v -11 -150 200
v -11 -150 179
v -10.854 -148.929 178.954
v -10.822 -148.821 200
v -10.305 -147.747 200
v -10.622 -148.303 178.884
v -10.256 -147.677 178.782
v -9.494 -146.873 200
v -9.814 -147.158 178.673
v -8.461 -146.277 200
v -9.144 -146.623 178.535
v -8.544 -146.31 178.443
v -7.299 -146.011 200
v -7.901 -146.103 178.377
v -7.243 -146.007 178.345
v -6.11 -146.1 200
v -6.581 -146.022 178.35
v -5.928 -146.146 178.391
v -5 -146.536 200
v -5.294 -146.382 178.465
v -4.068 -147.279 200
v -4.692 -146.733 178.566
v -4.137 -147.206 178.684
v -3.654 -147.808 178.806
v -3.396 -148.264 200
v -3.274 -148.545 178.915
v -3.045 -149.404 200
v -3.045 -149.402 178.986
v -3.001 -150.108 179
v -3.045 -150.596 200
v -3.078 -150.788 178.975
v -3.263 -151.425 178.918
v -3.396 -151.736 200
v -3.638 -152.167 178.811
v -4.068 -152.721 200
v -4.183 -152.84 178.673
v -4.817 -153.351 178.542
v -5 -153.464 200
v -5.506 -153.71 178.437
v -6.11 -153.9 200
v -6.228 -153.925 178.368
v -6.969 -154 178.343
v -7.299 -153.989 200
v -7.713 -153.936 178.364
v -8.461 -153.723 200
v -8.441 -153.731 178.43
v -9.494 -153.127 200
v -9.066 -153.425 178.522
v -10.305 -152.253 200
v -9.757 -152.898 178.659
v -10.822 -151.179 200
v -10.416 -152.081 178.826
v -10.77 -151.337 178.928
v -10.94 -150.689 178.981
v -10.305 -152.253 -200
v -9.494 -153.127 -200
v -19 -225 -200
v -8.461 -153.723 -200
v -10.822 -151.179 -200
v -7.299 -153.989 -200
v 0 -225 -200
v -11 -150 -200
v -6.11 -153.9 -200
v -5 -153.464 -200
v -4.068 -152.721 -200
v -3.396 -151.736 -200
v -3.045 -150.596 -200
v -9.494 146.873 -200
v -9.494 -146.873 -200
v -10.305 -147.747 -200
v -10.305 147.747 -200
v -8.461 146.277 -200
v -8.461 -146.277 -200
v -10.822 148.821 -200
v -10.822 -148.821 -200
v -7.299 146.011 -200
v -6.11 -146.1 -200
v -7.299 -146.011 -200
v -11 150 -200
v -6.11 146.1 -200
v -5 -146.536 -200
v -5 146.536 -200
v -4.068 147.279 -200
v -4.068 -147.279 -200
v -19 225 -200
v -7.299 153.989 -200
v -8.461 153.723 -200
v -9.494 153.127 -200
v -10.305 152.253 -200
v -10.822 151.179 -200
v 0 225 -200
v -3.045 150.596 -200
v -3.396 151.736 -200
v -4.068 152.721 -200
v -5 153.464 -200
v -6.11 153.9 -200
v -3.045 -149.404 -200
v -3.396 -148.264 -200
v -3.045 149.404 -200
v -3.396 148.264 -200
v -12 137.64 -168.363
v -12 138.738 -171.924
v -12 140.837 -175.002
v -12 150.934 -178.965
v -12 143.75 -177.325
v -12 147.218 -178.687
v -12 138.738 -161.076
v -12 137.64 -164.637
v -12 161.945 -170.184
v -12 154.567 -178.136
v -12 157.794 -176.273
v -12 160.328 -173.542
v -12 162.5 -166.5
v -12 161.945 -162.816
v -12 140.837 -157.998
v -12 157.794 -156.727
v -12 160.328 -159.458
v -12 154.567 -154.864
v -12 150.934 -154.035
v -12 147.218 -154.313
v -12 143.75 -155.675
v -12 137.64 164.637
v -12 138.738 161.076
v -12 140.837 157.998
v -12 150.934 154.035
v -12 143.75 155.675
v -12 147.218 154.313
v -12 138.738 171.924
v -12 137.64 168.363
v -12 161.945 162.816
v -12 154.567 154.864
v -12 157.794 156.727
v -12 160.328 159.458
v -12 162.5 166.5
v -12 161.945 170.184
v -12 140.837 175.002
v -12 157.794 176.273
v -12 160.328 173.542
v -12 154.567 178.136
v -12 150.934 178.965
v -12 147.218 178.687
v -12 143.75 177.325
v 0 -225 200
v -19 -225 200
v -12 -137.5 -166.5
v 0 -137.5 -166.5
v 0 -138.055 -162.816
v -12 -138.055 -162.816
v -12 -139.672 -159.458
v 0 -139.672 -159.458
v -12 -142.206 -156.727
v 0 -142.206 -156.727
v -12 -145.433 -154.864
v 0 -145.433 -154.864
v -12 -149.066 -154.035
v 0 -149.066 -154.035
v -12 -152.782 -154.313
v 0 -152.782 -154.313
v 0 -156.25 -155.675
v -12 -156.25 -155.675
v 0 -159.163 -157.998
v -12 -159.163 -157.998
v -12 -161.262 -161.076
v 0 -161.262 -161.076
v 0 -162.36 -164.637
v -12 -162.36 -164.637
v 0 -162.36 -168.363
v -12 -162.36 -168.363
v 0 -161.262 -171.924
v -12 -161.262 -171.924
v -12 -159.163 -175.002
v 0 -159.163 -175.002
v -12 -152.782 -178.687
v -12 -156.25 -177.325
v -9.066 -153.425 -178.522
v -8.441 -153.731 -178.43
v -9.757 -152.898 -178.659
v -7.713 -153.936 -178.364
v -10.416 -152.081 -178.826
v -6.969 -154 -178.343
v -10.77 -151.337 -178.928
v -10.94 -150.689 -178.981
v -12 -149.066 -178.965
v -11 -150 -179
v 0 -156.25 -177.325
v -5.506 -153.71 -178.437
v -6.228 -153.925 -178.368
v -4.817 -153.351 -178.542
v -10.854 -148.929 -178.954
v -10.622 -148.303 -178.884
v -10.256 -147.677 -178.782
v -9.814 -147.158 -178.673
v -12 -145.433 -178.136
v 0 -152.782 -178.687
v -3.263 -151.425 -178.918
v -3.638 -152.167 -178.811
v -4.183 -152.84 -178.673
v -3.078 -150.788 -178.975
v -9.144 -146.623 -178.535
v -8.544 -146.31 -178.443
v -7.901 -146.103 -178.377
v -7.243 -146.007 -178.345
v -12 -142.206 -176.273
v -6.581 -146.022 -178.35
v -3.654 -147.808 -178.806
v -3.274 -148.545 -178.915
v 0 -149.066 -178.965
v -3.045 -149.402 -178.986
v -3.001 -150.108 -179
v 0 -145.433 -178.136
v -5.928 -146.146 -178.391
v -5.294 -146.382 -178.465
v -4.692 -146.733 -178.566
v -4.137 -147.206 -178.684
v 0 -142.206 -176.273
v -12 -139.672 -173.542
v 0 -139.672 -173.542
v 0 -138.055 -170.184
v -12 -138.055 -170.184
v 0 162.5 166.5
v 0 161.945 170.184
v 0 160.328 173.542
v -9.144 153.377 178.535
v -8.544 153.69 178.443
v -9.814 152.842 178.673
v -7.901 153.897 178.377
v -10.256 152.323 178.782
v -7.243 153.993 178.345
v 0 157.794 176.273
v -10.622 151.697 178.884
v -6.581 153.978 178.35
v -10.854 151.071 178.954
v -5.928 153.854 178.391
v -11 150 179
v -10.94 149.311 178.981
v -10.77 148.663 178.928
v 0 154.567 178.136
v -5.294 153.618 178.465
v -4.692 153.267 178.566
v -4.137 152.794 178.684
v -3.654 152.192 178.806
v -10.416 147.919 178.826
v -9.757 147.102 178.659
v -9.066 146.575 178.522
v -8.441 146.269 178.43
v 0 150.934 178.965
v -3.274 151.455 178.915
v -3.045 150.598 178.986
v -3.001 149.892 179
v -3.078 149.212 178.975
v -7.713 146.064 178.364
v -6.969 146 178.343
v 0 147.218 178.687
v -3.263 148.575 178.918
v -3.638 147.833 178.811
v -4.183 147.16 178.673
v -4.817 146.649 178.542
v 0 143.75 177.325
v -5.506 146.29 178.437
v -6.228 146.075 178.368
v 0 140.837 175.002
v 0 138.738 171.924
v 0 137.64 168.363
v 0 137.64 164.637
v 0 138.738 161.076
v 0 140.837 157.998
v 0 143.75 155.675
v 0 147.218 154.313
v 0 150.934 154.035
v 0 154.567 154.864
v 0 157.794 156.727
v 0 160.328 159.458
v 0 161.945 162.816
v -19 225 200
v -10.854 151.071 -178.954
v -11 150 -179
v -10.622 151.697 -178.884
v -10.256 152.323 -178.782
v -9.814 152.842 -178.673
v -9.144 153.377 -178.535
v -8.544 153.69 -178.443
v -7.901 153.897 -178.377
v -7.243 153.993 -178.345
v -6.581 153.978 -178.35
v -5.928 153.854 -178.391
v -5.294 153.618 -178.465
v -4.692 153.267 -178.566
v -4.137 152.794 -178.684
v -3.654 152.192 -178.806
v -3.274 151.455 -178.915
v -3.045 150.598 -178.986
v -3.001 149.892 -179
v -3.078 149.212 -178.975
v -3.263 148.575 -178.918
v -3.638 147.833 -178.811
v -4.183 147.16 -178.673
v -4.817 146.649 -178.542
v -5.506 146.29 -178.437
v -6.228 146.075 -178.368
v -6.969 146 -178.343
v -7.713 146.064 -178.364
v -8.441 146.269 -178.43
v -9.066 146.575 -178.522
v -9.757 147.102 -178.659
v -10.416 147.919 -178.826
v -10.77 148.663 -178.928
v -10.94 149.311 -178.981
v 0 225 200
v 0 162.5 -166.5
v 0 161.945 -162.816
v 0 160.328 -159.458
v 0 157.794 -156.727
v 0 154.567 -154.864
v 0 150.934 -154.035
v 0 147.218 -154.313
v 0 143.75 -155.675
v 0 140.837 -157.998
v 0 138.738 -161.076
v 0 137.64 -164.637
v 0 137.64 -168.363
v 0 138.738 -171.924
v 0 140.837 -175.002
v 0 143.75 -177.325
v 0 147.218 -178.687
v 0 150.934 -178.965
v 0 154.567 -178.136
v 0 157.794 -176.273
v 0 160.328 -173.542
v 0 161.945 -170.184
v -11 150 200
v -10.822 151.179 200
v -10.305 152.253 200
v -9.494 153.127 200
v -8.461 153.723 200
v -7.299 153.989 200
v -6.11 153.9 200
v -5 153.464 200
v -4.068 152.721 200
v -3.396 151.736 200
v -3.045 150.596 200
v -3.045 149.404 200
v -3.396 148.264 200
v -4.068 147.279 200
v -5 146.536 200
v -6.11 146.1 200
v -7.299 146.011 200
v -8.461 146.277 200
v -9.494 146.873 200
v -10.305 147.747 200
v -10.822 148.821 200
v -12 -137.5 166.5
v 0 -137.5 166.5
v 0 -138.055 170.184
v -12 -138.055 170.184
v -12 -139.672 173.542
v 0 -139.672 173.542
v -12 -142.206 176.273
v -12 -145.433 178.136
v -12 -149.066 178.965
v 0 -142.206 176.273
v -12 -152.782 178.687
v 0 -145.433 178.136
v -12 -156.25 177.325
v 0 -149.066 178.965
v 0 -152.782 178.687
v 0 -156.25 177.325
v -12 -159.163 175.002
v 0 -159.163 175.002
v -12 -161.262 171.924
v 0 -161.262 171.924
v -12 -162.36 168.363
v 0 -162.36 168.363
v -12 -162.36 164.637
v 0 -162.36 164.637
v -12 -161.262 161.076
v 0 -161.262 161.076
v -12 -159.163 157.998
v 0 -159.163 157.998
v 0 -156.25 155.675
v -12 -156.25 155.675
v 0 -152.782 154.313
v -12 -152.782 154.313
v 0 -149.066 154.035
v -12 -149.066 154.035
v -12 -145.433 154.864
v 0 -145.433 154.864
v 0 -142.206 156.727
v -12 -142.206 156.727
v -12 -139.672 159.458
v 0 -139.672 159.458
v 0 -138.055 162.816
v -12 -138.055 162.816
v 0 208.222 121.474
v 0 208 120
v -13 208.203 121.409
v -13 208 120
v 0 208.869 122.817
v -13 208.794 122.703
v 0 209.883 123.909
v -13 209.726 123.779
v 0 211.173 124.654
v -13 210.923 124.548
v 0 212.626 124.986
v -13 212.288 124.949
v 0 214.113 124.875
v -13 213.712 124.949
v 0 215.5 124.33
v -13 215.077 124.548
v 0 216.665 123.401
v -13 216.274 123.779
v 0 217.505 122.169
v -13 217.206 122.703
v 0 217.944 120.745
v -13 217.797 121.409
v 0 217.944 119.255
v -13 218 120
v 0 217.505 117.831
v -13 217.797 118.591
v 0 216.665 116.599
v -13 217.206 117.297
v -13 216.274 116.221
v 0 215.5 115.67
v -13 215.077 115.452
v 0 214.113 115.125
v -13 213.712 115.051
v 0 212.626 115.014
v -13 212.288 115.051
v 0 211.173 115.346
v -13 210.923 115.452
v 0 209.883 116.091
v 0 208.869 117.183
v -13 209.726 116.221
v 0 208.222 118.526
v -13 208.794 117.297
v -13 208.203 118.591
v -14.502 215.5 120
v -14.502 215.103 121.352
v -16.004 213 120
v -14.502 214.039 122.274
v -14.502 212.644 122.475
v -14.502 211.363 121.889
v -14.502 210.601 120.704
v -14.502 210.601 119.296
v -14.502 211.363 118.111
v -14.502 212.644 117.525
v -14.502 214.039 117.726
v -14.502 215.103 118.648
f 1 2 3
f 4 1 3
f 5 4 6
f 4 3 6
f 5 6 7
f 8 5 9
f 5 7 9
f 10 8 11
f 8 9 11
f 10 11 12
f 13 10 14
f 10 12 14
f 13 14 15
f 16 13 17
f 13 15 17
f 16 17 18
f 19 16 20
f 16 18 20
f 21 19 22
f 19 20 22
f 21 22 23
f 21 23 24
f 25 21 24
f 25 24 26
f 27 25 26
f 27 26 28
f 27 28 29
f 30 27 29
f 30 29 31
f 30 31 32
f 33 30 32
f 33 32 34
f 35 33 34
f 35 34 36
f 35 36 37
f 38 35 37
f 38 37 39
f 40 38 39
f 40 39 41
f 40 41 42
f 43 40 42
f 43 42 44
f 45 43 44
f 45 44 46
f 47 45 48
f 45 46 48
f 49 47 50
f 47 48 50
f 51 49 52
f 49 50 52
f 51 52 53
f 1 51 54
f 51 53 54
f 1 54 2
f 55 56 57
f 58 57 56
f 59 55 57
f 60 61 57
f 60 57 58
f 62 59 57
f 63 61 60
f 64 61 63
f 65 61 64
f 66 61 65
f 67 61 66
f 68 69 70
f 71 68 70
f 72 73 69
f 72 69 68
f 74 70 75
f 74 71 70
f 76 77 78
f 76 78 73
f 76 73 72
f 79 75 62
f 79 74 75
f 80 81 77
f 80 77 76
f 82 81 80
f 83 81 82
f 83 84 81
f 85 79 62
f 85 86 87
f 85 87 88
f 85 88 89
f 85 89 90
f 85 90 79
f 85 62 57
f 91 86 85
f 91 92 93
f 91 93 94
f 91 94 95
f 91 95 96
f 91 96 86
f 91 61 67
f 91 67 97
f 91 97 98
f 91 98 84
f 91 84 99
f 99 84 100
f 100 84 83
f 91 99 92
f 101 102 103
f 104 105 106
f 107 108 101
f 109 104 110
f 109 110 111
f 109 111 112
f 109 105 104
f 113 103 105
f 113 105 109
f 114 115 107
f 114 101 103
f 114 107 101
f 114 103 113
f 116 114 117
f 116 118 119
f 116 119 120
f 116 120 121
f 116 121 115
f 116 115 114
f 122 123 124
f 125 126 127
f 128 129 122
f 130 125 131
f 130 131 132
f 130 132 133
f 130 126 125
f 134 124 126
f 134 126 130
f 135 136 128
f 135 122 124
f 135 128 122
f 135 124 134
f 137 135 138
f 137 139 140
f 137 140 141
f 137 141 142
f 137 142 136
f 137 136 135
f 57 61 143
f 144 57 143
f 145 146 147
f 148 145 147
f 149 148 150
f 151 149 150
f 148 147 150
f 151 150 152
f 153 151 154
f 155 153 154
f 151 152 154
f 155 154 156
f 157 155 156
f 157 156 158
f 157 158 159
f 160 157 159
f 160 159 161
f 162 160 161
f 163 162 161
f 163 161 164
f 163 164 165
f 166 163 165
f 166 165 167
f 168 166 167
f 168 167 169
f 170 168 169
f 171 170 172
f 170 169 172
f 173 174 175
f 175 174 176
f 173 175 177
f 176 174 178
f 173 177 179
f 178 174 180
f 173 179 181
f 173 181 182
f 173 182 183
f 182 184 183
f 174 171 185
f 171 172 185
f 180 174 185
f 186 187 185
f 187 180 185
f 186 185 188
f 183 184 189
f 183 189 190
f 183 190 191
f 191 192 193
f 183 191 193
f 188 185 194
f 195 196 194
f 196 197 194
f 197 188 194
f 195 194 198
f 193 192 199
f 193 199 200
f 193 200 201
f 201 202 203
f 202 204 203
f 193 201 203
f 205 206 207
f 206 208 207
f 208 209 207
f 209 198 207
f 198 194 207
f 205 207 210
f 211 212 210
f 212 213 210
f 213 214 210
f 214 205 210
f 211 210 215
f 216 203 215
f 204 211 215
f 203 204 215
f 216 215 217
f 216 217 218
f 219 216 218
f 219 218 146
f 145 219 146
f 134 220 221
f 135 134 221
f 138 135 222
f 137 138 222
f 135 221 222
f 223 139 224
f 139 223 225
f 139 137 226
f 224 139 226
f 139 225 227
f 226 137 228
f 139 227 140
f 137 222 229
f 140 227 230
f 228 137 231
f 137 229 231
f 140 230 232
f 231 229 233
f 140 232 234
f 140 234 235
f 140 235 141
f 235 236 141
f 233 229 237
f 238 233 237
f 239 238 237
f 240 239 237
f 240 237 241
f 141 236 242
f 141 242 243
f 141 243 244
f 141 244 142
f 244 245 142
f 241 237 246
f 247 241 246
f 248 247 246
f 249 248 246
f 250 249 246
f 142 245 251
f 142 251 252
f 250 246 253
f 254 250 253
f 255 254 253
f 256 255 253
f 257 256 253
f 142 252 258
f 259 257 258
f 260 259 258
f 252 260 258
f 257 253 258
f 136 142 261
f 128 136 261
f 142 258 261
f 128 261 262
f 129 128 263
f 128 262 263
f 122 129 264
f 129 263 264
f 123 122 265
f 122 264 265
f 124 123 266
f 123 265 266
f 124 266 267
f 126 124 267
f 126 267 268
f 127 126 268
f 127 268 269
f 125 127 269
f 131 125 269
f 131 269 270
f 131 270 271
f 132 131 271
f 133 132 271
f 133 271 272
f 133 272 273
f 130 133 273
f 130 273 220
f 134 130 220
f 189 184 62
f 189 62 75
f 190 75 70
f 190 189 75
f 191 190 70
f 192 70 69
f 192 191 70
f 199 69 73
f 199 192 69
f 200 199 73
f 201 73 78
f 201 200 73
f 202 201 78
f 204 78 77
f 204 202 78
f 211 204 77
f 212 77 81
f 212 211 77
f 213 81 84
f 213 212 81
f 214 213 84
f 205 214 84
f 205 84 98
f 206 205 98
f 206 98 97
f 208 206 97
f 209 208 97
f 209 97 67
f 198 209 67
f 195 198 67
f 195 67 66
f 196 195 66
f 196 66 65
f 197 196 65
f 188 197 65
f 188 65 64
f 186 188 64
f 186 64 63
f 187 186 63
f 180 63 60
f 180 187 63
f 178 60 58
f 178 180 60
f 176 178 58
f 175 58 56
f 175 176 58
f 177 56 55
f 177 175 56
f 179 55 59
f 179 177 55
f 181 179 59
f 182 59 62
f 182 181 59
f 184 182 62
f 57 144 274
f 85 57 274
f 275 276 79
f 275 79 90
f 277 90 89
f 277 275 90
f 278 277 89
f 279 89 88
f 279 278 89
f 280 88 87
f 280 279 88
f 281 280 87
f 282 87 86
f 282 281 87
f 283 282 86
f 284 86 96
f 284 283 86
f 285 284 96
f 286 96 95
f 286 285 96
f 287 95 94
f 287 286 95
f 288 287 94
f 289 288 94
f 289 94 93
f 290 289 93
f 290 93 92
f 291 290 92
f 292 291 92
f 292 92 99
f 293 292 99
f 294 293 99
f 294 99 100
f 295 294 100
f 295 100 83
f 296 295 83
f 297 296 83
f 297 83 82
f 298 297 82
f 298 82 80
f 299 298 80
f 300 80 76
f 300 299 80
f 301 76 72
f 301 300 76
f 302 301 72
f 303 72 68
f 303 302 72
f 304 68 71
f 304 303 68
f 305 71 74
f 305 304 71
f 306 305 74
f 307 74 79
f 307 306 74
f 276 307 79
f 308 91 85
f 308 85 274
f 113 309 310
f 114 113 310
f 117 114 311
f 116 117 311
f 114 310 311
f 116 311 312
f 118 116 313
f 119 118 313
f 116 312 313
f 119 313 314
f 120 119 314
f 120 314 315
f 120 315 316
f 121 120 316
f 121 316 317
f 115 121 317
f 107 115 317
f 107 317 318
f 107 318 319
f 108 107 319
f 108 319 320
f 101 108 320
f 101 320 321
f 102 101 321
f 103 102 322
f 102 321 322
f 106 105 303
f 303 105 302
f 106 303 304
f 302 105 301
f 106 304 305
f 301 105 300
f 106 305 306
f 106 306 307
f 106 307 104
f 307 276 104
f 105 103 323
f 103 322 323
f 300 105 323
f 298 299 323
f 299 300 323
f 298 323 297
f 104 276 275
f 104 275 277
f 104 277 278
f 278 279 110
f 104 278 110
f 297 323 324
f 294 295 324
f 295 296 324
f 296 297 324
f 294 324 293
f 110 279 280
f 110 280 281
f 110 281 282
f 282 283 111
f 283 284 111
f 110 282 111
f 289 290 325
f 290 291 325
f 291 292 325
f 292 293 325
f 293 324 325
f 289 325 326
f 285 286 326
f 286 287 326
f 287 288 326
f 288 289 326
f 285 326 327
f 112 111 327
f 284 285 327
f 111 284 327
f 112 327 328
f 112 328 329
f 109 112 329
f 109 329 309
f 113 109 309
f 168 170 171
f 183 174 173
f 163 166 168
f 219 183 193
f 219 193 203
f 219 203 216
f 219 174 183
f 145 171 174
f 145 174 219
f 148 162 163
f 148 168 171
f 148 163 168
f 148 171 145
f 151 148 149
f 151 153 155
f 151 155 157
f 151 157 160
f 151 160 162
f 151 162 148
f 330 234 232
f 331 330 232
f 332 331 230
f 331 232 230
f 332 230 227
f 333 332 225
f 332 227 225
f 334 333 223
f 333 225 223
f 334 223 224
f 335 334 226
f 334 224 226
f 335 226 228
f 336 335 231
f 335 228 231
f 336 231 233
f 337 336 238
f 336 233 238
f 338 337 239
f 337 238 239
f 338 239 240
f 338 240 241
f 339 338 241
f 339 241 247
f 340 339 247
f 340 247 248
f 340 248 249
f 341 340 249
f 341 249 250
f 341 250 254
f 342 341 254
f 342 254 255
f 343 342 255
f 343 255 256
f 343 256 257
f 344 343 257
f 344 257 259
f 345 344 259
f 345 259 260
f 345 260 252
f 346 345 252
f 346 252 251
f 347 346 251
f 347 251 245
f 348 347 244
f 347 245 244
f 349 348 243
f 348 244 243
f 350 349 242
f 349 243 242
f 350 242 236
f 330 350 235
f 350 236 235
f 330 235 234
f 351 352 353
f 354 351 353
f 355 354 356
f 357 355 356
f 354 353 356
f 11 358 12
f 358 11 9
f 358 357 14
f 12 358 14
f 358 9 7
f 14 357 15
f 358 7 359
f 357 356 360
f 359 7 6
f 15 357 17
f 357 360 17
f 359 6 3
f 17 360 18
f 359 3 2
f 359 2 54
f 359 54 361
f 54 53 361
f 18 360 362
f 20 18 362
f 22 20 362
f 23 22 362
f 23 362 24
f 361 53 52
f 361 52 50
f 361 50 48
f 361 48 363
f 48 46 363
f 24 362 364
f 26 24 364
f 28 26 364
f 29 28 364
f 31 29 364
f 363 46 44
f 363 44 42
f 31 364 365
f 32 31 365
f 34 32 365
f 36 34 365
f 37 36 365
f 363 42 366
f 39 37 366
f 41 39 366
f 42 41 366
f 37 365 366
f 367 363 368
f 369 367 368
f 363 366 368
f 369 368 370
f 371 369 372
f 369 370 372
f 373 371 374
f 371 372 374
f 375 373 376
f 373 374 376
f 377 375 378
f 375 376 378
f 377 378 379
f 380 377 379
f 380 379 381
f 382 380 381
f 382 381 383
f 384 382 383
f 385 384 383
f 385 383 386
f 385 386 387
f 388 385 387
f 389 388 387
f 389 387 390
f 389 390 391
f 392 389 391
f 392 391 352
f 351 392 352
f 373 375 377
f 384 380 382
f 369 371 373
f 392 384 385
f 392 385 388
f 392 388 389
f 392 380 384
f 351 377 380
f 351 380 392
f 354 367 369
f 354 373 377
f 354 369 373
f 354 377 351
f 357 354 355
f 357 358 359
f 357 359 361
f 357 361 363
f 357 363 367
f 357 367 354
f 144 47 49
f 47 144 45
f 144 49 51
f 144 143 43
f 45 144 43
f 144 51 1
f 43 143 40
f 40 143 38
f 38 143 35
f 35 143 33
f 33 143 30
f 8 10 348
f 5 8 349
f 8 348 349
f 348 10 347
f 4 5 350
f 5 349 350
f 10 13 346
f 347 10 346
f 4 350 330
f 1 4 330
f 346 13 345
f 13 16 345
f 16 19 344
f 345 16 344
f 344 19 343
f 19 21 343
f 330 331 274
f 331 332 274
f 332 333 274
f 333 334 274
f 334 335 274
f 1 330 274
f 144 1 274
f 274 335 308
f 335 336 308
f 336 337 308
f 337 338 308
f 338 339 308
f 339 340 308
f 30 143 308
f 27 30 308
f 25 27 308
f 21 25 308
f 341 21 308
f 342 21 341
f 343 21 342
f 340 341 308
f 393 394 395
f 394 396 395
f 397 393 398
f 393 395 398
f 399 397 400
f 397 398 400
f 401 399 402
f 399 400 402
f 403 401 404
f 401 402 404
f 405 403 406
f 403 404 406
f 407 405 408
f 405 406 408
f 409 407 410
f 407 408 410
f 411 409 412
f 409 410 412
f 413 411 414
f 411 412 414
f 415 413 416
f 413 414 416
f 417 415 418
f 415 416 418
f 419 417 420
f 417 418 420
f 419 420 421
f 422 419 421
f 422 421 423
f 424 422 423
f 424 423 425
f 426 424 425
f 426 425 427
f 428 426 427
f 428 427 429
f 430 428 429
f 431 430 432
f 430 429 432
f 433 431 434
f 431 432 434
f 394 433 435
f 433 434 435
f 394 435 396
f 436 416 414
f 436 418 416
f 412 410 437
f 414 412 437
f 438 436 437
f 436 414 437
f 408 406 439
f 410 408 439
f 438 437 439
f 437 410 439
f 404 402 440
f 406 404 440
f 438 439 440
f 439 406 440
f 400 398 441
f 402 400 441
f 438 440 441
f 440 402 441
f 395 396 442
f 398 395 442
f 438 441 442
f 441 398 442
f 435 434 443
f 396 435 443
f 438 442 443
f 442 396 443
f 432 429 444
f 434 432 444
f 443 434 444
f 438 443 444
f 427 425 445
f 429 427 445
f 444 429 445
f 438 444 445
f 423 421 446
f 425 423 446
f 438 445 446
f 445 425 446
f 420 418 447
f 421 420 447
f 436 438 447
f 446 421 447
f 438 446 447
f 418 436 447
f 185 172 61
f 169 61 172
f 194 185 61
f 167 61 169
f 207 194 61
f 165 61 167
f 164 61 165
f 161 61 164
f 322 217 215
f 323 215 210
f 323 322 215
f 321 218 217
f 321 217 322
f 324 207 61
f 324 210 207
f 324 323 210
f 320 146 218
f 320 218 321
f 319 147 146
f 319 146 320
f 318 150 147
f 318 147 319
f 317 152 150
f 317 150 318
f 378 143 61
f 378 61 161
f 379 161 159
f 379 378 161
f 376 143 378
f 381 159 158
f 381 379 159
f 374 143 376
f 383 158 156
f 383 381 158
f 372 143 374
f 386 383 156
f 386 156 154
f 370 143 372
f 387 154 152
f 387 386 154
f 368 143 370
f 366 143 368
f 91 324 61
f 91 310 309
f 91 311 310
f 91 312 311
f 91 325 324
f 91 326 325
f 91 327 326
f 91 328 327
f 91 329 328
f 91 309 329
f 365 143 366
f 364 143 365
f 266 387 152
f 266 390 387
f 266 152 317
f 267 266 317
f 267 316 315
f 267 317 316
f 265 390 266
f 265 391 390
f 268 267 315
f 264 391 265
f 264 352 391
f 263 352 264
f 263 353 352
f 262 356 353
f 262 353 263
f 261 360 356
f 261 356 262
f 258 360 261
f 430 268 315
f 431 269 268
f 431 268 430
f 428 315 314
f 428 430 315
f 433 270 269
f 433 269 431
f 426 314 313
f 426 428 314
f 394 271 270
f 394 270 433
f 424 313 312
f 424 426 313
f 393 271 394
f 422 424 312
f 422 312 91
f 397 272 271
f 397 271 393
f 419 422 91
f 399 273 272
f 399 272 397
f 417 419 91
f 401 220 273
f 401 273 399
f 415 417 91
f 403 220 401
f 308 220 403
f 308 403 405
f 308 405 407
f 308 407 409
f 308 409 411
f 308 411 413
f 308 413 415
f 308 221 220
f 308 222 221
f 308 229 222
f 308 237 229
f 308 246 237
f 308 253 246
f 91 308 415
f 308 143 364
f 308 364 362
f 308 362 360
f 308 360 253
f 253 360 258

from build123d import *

# Parameters (mm, degrees)
F0_W     = 450
F0_H     = 400
F1_DEPTH = 19
F2_R     = 12.5
F3_DEPTH = 12
F5_D     = 8
F5_DEPTH = 22
F5_TIP   = 2.4034424761
F7_D     = 10
F7_DEPTH = 13
F7_TIP   = 3.0043030951


# Not quite as in the source:
# - a pattern or mirror of a feature is missing from the dataset's text; its kind, count and spacing are read off the source's solid


with BuildPart() as f1:
    # F0 (on Right) → F1 (new body)
    with BuildSketch(Plane.YZ):
        Rectangle(F0_W, F0_H)
    extrude(amount=-F1_DEPTH)

    # F2 (on face) → F3 (cut)
    with BuildSketch(Plane.YZ):
        with Locations((-150, -166.5)):
            Circle(F2_R)
        with Locations((150, -166.5)):
            Circle(F2_R)
        with Locations((-150, 166.5)):
            Circle(F2_R)
        with Locations((150, 166.5)):
            Circle(F2_R)
    extrude(amount=-F3_DEPTH, mode=Mode.SUBTRACT)

    # F5
    with Locations(Plane.XY.offset(200)):
        with Locations((-7, 150), (-7, -150)):
            f5 = Hole(F5_D / 2, depth=F5_DEPTH)
            with Locations((0, 0, -(F5_DEPTH + F5_TIP / 2))):  # 118° drill point
                Cone(0, F5_D / 2, F5_TIP, mode=Mode.SUBTRACT)

    # F5_copies: F5 across plane
    add(f5.mirror(Plane(origin=(0, 0, 2.1e-05), x_dir=(-1, 0, 0), z_dir=(0, 0, -1))), mode=Mode.SUBTRACT)

    # F7
    with Locations(Plane.YZ):
        with Locations((213, 120)):
            Hole(F7_D / 2, depth=F7_DEPTH)
            with Locations((0, 0, -(F7_DEPTH + F7_TIP / 2))):  # 118° drill point
                Cone(0, F7_D / 2, F7_TIP, mode=Mode.SUBTRACT)


solid = f1.part
